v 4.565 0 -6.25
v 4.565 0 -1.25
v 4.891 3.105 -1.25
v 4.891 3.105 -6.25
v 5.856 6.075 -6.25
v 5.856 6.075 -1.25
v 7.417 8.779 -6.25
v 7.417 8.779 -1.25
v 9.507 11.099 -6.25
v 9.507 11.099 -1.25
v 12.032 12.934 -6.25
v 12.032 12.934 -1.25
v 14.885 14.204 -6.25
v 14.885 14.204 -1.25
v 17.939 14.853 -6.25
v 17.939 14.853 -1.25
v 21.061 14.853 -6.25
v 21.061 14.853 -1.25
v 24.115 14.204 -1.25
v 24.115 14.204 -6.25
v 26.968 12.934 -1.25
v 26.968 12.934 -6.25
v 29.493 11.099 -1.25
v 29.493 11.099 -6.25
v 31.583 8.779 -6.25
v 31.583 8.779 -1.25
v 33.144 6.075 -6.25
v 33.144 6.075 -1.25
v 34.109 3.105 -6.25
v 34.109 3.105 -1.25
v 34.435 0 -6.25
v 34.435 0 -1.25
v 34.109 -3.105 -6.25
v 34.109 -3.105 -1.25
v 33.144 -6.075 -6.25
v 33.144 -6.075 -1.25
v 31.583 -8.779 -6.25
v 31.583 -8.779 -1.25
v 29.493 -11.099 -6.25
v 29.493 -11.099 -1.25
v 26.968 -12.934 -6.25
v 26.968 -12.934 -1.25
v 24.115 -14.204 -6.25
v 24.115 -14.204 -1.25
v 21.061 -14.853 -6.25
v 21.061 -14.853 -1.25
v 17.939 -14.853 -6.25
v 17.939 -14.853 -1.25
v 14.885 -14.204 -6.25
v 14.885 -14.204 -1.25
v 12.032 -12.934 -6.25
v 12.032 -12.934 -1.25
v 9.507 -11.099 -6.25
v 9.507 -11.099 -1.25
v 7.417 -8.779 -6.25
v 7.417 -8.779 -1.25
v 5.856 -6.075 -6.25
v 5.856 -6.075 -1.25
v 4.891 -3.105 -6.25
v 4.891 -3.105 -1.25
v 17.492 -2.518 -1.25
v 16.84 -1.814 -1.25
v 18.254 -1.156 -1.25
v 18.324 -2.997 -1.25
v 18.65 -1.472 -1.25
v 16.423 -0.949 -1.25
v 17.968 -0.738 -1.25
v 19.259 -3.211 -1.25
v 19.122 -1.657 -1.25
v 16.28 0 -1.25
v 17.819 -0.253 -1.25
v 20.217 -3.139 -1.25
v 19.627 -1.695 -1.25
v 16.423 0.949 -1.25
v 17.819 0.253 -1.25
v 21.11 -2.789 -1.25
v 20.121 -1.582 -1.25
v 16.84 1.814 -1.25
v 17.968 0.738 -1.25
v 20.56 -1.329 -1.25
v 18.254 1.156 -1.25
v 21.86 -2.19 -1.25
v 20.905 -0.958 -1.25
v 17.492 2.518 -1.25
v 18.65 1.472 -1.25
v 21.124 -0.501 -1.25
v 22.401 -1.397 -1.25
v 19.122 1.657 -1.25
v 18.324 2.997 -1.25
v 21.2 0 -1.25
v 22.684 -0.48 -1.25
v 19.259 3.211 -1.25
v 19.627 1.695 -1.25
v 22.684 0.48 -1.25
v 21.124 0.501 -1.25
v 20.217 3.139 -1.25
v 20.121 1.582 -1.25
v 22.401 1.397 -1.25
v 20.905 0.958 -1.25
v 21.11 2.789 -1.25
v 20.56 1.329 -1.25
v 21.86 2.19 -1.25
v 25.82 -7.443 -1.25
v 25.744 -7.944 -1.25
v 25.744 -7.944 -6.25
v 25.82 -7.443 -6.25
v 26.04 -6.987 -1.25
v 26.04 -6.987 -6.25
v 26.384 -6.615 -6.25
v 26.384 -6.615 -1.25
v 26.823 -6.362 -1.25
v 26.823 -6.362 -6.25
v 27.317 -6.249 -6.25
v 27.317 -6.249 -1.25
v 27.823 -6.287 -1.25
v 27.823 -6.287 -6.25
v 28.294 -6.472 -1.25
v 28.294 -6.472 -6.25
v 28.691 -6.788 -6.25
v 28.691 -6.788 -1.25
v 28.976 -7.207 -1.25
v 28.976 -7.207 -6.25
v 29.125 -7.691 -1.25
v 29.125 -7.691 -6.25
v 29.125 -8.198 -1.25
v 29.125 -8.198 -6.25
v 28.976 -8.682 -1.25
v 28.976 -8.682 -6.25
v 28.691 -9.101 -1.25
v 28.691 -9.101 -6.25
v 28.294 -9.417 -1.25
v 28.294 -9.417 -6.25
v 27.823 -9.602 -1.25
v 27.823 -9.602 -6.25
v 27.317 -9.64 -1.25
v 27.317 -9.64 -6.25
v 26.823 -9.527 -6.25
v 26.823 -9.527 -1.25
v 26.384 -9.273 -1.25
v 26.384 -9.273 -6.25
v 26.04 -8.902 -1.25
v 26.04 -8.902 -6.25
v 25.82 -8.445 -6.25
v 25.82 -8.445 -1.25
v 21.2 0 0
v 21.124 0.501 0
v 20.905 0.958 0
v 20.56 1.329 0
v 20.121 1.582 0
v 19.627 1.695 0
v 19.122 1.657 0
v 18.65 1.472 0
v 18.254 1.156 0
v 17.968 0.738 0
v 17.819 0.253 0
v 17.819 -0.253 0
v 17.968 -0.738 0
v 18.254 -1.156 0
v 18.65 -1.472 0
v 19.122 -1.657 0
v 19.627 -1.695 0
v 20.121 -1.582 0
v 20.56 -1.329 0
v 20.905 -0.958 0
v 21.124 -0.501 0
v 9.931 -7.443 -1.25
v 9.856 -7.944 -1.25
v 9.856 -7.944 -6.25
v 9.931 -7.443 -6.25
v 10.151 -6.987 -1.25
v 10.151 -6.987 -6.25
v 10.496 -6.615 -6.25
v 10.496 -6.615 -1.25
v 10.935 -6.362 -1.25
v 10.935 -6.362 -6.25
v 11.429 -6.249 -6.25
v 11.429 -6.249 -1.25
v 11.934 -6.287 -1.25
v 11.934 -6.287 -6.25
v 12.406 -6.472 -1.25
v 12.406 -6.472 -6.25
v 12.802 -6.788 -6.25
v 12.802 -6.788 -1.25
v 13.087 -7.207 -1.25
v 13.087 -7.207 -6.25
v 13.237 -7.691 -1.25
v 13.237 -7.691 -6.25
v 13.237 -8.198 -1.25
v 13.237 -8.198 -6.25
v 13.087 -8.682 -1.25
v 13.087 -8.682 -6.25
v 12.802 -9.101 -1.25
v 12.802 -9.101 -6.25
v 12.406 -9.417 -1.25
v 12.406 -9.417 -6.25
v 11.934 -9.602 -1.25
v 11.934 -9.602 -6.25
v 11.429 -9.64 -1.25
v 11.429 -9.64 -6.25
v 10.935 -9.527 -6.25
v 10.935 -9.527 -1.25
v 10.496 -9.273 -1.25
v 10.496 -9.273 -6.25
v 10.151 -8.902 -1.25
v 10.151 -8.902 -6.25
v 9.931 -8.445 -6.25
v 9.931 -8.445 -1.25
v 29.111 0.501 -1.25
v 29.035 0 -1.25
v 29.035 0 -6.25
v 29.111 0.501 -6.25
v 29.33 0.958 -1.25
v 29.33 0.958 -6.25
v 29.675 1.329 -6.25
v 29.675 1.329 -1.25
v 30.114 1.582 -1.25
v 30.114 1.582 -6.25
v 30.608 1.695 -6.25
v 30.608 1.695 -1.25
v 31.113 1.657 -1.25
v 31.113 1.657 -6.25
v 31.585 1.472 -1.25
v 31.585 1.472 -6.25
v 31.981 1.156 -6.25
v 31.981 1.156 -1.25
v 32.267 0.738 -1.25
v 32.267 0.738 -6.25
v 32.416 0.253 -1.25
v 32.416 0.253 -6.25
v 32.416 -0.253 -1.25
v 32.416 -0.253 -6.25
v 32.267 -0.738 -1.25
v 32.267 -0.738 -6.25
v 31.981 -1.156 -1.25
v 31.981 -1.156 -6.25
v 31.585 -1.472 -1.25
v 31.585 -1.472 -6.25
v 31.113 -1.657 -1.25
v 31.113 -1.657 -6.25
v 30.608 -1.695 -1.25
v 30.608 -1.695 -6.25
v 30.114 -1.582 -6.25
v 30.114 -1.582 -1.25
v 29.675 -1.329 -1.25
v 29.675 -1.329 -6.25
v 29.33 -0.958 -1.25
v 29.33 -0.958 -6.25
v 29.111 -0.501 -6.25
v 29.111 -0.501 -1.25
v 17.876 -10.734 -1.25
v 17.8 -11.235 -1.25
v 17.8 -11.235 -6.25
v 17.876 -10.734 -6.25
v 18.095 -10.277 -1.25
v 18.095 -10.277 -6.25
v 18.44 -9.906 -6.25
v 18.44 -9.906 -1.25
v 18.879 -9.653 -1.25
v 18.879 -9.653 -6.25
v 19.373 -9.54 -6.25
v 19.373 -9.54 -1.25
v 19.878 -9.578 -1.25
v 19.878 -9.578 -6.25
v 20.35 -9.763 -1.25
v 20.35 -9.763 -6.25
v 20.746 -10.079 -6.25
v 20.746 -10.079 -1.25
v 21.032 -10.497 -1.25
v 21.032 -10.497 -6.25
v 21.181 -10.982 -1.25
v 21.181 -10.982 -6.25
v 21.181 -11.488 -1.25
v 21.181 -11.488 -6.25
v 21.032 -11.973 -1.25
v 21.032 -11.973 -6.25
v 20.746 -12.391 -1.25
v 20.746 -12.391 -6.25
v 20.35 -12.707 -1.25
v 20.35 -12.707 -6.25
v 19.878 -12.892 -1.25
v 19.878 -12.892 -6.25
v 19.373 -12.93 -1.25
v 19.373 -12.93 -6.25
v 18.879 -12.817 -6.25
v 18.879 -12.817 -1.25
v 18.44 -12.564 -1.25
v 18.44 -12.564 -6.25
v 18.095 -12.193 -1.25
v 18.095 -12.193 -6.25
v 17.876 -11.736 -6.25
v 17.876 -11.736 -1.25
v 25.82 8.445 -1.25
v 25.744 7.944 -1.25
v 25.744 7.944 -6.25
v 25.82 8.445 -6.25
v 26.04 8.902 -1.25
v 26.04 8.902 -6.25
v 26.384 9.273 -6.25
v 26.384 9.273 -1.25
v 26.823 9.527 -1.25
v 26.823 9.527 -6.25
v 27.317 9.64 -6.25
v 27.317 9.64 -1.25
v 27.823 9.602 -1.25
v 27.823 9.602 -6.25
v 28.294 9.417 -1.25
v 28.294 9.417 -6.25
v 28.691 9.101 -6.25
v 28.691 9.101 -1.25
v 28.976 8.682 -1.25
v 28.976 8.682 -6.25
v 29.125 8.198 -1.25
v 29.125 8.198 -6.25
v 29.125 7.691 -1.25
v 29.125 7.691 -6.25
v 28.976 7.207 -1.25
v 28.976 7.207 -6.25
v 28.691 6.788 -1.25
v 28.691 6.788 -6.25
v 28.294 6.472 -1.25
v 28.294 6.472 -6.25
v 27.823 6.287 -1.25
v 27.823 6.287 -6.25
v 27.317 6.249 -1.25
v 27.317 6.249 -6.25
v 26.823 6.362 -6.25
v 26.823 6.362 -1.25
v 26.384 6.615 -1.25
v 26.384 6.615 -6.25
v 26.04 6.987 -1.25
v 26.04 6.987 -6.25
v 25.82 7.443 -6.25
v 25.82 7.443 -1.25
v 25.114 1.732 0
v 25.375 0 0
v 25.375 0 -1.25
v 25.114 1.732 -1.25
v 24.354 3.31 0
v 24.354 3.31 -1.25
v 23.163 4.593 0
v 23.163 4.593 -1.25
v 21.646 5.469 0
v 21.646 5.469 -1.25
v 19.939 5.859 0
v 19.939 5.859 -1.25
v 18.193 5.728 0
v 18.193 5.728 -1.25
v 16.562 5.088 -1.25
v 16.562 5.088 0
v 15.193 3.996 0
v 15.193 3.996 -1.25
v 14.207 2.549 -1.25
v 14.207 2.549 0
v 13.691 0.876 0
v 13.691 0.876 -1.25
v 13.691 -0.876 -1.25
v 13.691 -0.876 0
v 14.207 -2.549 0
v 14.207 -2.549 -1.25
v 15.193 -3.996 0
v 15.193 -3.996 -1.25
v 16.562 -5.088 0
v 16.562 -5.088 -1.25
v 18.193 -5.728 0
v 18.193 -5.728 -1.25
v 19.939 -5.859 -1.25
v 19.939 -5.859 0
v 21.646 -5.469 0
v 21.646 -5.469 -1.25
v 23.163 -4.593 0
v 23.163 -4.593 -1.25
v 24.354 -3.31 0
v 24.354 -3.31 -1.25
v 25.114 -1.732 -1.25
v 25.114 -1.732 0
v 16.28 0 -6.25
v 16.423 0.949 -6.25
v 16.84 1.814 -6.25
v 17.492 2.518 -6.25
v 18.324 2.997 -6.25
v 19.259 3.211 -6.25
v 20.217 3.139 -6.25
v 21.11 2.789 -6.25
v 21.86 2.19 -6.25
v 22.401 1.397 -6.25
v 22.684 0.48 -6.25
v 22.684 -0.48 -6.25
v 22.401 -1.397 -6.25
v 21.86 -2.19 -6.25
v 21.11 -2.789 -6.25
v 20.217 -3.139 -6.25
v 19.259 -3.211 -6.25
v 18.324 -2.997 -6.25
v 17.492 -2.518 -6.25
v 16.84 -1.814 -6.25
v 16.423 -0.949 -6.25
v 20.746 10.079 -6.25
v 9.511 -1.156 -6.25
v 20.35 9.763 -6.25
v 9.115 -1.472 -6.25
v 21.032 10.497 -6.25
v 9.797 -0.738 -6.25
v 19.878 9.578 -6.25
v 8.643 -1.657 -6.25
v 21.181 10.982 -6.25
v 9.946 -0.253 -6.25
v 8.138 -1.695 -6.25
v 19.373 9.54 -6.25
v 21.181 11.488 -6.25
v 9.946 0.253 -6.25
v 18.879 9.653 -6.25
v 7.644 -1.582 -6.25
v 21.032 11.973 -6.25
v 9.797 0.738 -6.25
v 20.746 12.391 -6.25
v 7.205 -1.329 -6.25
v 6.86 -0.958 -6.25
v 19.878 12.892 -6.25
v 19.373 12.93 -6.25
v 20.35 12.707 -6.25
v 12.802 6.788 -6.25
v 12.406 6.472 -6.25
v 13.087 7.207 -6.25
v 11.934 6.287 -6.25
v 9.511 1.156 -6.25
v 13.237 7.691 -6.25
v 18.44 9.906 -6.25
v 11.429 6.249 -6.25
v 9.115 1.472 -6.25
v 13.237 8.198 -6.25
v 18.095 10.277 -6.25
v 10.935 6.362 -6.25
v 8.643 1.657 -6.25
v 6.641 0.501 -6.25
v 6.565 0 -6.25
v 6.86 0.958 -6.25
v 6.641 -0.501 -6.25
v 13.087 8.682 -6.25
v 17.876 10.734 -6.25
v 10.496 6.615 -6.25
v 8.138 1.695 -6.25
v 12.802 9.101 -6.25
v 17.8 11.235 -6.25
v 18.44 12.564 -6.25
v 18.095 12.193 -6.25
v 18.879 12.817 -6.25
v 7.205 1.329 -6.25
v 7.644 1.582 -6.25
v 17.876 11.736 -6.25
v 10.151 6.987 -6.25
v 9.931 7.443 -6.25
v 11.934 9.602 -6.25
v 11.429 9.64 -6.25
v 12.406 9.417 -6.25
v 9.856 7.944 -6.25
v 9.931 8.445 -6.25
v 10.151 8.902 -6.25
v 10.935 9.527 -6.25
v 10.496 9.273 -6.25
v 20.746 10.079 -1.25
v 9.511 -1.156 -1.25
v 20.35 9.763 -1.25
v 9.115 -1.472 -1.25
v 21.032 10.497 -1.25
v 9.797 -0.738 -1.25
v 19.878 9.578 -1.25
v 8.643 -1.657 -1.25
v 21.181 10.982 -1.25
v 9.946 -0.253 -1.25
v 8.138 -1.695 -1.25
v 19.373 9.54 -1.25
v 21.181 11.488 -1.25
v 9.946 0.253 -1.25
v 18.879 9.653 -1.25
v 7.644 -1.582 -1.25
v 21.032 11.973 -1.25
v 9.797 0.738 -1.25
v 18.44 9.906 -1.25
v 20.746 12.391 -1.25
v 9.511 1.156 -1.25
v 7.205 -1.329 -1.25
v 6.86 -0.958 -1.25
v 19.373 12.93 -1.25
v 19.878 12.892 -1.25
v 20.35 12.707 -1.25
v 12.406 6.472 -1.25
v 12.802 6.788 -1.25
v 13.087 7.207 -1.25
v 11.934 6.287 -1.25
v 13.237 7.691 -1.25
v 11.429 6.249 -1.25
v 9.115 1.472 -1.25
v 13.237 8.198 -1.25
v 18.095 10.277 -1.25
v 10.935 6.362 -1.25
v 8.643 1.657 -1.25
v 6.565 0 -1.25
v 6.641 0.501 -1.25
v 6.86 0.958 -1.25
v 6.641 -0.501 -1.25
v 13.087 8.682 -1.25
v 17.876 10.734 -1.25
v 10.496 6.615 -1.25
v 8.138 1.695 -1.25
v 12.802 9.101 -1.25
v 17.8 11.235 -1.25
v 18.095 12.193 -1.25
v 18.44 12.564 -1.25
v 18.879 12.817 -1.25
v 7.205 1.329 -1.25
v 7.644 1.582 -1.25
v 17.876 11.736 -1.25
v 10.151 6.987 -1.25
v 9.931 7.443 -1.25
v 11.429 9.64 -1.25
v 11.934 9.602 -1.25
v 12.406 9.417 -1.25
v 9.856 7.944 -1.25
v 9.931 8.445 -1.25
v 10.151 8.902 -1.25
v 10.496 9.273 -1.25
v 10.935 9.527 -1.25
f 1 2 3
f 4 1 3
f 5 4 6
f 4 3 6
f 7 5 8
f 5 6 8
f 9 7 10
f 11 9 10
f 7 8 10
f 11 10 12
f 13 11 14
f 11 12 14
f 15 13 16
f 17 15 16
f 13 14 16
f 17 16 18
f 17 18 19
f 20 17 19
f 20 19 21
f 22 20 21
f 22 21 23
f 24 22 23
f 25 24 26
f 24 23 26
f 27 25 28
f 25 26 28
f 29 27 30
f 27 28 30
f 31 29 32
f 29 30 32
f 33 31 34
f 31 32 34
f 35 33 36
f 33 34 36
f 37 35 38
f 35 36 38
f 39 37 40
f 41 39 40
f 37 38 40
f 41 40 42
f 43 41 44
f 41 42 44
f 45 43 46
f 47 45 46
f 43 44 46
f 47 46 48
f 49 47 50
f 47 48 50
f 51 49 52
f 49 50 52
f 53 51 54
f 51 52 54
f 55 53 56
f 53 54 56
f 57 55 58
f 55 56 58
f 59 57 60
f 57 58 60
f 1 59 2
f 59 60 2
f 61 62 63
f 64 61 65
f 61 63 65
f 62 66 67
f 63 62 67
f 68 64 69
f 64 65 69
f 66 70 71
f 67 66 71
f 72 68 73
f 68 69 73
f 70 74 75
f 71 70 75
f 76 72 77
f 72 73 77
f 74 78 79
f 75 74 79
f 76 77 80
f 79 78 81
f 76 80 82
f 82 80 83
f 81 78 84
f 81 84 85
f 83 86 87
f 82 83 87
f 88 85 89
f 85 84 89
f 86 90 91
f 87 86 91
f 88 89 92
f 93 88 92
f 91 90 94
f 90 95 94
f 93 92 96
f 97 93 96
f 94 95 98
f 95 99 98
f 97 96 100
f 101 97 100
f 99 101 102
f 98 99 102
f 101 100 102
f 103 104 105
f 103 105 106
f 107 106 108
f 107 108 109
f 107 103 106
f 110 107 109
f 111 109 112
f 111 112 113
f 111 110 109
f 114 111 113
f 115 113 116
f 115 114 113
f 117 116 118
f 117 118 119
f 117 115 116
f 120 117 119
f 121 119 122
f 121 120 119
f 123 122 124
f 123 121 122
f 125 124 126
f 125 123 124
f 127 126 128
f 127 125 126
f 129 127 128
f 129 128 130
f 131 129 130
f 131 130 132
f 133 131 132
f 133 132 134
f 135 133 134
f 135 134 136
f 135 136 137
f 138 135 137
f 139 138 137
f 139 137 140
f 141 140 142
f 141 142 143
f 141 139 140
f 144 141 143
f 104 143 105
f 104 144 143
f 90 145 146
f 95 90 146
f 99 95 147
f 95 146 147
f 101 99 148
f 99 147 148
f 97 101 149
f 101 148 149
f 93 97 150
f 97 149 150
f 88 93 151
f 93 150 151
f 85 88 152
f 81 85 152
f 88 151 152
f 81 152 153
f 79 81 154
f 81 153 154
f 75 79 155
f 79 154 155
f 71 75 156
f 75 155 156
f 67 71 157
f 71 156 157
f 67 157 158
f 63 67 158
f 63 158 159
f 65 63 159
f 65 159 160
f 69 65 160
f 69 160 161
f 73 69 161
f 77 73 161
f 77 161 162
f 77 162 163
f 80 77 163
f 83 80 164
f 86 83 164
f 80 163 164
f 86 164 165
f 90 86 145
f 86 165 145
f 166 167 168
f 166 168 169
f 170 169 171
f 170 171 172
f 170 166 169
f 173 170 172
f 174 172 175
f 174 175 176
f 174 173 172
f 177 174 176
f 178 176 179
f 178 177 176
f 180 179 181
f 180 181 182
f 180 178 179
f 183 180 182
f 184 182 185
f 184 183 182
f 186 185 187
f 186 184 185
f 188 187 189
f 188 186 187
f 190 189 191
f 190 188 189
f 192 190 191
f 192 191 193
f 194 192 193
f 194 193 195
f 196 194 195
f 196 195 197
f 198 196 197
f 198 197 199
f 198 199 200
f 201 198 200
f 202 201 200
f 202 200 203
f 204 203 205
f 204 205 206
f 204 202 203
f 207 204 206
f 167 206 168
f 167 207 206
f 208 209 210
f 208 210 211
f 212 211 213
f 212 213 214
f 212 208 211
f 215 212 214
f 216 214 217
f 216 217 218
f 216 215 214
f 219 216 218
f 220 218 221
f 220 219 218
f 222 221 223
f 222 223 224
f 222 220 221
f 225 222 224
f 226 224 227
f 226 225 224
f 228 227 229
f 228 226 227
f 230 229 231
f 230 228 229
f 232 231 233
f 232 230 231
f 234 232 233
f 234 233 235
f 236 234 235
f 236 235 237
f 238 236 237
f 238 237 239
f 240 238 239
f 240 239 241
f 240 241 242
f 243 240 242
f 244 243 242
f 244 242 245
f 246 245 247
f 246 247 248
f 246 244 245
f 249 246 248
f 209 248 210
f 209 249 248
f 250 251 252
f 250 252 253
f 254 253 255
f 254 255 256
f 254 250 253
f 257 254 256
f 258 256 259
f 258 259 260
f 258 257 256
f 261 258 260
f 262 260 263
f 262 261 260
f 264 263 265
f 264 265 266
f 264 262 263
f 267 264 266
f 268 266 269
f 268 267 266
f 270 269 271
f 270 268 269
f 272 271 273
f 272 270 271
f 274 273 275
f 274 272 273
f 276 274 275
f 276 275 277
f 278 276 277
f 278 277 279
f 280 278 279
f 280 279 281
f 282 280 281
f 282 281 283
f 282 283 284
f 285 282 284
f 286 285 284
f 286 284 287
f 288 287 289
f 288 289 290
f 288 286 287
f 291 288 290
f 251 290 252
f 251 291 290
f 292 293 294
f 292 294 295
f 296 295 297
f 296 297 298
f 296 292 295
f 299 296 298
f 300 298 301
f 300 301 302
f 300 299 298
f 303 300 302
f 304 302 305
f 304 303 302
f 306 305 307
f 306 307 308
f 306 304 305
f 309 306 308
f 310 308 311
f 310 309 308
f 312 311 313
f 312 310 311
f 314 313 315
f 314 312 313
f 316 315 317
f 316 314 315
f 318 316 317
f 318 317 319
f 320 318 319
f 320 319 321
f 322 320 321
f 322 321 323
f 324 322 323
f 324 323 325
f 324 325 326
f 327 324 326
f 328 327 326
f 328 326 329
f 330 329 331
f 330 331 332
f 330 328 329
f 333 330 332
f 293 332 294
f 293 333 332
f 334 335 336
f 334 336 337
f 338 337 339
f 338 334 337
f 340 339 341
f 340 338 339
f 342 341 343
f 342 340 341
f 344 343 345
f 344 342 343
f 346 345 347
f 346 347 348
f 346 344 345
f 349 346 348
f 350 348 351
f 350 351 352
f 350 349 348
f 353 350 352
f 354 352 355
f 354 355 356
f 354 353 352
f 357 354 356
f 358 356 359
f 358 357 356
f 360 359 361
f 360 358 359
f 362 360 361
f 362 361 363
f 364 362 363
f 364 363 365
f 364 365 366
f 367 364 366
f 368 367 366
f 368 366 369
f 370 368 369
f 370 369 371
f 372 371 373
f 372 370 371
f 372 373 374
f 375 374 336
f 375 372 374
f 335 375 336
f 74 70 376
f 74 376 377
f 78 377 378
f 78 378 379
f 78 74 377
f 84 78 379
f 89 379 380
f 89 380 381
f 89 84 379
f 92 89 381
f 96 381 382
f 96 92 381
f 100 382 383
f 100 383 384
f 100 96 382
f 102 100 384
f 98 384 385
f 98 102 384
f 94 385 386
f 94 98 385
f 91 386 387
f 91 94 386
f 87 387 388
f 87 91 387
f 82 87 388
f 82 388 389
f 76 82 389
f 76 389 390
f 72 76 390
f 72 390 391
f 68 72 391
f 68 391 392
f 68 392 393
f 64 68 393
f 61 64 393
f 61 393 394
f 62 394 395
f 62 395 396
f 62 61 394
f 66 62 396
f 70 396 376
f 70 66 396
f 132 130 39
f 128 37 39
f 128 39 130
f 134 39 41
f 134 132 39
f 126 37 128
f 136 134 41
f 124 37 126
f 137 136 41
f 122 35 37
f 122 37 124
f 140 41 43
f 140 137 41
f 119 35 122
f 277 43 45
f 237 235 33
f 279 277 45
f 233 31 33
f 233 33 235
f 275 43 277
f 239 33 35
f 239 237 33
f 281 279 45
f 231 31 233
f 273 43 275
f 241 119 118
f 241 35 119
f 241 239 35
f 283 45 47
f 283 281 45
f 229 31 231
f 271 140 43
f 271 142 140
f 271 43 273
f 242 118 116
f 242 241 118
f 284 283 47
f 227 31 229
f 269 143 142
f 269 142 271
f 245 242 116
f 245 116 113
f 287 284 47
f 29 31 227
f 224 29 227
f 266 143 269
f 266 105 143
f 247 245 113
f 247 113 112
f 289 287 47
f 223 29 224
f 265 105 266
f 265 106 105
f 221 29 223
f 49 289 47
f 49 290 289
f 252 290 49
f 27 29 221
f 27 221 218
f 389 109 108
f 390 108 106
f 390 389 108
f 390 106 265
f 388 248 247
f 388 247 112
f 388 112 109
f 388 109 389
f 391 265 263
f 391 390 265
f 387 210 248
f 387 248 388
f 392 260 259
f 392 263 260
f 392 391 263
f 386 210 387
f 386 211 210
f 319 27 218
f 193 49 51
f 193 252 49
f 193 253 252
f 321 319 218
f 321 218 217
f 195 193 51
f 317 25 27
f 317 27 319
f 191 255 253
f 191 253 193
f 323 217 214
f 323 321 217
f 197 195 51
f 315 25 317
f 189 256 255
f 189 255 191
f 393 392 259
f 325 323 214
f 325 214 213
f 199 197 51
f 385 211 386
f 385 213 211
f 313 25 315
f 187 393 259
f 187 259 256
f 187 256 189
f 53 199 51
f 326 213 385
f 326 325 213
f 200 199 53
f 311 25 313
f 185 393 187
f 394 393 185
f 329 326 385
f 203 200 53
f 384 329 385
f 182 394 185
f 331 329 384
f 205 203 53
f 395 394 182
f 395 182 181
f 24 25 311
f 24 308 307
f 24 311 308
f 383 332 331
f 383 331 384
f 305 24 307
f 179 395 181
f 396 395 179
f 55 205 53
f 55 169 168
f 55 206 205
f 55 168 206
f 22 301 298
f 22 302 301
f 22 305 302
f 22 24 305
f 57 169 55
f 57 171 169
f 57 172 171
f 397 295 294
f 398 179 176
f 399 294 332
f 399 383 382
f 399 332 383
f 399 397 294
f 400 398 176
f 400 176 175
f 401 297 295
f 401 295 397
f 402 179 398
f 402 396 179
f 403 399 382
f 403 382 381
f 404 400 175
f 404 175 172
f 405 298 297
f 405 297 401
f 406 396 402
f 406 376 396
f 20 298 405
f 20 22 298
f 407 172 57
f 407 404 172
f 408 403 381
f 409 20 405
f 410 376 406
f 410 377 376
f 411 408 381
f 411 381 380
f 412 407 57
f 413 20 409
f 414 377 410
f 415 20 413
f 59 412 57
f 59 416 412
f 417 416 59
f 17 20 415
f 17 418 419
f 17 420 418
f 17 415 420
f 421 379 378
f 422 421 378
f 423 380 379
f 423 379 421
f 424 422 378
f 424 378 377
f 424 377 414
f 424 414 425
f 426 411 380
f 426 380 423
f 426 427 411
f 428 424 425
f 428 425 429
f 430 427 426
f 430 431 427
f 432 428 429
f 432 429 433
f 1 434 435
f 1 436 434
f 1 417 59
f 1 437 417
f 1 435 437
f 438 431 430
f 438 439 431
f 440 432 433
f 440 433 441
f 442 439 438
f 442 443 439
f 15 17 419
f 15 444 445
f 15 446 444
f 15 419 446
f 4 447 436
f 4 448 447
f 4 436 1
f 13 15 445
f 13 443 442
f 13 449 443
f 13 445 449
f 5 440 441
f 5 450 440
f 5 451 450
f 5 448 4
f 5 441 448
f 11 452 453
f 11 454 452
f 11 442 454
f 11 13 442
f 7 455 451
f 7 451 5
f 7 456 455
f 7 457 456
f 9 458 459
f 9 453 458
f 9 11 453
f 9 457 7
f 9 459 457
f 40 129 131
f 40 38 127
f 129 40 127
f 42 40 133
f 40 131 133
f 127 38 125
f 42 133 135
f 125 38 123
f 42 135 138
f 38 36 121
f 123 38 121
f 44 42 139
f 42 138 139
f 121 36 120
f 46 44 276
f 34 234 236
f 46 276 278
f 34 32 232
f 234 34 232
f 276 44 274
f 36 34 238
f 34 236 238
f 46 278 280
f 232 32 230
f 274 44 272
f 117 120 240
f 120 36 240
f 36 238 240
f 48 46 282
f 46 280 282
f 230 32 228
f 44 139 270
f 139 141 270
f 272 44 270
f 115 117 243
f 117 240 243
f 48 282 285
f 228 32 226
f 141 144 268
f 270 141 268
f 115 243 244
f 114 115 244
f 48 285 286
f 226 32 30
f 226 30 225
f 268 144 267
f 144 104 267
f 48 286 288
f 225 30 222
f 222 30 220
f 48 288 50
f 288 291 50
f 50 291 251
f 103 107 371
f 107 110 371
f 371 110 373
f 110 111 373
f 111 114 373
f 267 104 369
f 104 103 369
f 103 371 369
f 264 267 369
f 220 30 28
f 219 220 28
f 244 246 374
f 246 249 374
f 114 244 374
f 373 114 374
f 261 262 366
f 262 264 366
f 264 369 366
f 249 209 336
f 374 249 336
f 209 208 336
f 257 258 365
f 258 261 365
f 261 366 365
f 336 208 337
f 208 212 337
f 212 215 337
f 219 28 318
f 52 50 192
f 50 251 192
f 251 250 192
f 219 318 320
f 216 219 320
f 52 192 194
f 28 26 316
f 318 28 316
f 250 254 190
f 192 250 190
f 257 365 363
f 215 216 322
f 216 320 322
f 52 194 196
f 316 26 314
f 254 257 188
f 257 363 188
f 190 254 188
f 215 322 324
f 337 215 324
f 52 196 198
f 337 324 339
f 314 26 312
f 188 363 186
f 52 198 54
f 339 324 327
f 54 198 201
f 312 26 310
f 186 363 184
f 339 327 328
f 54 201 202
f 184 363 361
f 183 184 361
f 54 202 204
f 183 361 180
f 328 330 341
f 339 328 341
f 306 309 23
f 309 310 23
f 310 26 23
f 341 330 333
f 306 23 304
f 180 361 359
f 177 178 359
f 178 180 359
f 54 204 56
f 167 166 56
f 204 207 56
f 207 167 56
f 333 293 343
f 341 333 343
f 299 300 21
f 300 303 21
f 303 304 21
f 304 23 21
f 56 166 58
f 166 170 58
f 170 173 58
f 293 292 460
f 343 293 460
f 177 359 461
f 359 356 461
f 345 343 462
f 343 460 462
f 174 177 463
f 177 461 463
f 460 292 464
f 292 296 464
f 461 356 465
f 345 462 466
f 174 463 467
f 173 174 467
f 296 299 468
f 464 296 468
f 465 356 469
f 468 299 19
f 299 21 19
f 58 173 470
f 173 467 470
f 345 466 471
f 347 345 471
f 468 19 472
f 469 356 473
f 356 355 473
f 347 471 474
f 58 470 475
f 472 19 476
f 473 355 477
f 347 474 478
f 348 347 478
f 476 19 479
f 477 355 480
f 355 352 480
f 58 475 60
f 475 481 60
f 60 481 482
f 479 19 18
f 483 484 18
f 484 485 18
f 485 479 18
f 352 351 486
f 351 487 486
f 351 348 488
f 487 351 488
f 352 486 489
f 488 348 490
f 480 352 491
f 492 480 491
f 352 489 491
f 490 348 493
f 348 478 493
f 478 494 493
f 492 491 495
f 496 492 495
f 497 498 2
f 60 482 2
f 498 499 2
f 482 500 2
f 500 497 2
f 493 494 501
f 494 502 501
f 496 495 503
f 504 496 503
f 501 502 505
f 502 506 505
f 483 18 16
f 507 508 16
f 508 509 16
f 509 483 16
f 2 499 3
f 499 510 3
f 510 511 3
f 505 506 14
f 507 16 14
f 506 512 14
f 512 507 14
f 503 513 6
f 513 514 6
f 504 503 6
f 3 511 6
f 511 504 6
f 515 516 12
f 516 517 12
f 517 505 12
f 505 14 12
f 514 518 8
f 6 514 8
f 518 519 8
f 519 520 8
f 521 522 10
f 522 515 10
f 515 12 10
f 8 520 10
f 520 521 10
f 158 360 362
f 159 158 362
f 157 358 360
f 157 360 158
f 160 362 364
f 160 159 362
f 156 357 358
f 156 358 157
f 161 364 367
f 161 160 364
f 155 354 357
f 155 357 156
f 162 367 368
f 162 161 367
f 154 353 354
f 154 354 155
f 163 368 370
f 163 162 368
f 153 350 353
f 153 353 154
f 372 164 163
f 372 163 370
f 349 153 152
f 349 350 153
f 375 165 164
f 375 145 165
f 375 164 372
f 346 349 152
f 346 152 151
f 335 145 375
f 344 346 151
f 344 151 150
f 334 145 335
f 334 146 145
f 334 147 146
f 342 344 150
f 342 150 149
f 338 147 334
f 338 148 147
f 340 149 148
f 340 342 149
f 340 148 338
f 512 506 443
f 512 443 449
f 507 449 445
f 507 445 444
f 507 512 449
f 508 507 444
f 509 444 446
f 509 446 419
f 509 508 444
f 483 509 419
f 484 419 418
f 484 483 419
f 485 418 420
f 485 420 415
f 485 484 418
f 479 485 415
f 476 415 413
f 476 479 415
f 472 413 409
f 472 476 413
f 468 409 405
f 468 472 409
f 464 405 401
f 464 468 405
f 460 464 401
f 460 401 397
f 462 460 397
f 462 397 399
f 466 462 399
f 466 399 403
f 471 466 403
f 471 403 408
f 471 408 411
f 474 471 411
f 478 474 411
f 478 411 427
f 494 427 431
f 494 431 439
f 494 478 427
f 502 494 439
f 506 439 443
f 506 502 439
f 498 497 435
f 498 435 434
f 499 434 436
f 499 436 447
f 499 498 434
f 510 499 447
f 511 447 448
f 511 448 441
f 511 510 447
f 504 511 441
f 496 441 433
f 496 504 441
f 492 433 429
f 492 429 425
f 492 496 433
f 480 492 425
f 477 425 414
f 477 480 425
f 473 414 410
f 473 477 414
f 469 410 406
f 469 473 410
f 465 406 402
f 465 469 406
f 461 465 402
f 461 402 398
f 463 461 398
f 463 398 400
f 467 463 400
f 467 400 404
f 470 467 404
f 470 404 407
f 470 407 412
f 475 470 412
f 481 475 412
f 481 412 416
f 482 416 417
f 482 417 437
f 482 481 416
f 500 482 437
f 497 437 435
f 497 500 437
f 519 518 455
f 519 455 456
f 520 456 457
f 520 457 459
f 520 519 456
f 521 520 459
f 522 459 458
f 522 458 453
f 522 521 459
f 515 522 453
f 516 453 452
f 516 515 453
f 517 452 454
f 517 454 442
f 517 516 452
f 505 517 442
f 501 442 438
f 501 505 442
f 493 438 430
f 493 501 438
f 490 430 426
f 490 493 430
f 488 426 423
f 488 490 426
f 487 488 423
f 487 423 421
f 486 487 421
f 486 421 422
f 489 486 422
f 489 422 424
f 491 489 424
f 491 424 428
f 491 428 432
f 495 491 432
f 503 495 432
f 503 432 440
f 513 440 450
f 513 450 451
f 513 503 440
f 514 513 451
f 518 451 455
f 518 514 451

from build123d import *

# Parameters (mm, degrees)
SKETCH1_R           = 5.875
SKETCH1_R_2         = 1.7
BOSS_EXTRUDE1_DEPTH = 1.25
SKETCH2_R           = 14.935
SKETCH2_R_2         = 1.7
SKETCH2_R_3         = 3.220003918
BOSS_EXTRUDE2_DEPTH = 5


with BuildPart() as part:
    # Sketch1 → Boss-Extrude1 (new body)
    with BuildSketch(Plane.XY):
        with Locations((19.5, 0)):
            Circle(SKETCH1_R)
        with Locations((19.5, 0)):
            Circle(SKETCH1_R_2, mode=Mode.SUBTRACT)
    extrude(amount=-BOSS_EXTRUDE1_DEPTH)

    # Sketch2 → Boss-Extrude2 (add)
    with BuildSketch(Plane(origin=(0, 0, -1.25), x_dir=(-1, 0, 0), z_dir=(0, 0, -1))):
        with Locations((-19.5, 0)):
            Circle(SKETCH2_R)
        with Locations((-19.5, -11.235)):
            Circle(SKETCH2_R_2, mode=Mode.SUBTRACT)
        with Locations((-19.5, 0)):
            Circle(SKETCH2_R_3, mode=Mode.SUBTRACT)
        with Locations((-27.444344687, -7.944344687)):
            Circle(SKETCH2_R_2, mode=Mode.SUBTRACT)
        with Locations((-30.735, 0)):
            Circle(SKETCH2_R_2, mode=Mode.SUBTRACT)
        with Locations((-27.444344687, 7.944344686)):
            Circle(SKETCH2_R_2, mode=Mode.SUBTRACT)
        with Locations((-19.5, 11.235)):
            Circle(SKETCH2_R_2, mode=Mode.SUBTRACT)
        with Locations((-11.555655313, 7.944344686)):
            Circle(SKETCH2_R_2, mode=Mode.SUBTRACT)
        with Locations((-8.265, 0)):
            Circle(SKETCH2_R_2, mode=Mode.SUBTRACT)
        with Locations((-11.555655313, -7.944344687)):
            Circle(SKETCH2_R_2, mode=Mode.SUBTRACT)
    extrude(amount=BOSS_EXTRUDE2_DEPTH)


solid = part.part
